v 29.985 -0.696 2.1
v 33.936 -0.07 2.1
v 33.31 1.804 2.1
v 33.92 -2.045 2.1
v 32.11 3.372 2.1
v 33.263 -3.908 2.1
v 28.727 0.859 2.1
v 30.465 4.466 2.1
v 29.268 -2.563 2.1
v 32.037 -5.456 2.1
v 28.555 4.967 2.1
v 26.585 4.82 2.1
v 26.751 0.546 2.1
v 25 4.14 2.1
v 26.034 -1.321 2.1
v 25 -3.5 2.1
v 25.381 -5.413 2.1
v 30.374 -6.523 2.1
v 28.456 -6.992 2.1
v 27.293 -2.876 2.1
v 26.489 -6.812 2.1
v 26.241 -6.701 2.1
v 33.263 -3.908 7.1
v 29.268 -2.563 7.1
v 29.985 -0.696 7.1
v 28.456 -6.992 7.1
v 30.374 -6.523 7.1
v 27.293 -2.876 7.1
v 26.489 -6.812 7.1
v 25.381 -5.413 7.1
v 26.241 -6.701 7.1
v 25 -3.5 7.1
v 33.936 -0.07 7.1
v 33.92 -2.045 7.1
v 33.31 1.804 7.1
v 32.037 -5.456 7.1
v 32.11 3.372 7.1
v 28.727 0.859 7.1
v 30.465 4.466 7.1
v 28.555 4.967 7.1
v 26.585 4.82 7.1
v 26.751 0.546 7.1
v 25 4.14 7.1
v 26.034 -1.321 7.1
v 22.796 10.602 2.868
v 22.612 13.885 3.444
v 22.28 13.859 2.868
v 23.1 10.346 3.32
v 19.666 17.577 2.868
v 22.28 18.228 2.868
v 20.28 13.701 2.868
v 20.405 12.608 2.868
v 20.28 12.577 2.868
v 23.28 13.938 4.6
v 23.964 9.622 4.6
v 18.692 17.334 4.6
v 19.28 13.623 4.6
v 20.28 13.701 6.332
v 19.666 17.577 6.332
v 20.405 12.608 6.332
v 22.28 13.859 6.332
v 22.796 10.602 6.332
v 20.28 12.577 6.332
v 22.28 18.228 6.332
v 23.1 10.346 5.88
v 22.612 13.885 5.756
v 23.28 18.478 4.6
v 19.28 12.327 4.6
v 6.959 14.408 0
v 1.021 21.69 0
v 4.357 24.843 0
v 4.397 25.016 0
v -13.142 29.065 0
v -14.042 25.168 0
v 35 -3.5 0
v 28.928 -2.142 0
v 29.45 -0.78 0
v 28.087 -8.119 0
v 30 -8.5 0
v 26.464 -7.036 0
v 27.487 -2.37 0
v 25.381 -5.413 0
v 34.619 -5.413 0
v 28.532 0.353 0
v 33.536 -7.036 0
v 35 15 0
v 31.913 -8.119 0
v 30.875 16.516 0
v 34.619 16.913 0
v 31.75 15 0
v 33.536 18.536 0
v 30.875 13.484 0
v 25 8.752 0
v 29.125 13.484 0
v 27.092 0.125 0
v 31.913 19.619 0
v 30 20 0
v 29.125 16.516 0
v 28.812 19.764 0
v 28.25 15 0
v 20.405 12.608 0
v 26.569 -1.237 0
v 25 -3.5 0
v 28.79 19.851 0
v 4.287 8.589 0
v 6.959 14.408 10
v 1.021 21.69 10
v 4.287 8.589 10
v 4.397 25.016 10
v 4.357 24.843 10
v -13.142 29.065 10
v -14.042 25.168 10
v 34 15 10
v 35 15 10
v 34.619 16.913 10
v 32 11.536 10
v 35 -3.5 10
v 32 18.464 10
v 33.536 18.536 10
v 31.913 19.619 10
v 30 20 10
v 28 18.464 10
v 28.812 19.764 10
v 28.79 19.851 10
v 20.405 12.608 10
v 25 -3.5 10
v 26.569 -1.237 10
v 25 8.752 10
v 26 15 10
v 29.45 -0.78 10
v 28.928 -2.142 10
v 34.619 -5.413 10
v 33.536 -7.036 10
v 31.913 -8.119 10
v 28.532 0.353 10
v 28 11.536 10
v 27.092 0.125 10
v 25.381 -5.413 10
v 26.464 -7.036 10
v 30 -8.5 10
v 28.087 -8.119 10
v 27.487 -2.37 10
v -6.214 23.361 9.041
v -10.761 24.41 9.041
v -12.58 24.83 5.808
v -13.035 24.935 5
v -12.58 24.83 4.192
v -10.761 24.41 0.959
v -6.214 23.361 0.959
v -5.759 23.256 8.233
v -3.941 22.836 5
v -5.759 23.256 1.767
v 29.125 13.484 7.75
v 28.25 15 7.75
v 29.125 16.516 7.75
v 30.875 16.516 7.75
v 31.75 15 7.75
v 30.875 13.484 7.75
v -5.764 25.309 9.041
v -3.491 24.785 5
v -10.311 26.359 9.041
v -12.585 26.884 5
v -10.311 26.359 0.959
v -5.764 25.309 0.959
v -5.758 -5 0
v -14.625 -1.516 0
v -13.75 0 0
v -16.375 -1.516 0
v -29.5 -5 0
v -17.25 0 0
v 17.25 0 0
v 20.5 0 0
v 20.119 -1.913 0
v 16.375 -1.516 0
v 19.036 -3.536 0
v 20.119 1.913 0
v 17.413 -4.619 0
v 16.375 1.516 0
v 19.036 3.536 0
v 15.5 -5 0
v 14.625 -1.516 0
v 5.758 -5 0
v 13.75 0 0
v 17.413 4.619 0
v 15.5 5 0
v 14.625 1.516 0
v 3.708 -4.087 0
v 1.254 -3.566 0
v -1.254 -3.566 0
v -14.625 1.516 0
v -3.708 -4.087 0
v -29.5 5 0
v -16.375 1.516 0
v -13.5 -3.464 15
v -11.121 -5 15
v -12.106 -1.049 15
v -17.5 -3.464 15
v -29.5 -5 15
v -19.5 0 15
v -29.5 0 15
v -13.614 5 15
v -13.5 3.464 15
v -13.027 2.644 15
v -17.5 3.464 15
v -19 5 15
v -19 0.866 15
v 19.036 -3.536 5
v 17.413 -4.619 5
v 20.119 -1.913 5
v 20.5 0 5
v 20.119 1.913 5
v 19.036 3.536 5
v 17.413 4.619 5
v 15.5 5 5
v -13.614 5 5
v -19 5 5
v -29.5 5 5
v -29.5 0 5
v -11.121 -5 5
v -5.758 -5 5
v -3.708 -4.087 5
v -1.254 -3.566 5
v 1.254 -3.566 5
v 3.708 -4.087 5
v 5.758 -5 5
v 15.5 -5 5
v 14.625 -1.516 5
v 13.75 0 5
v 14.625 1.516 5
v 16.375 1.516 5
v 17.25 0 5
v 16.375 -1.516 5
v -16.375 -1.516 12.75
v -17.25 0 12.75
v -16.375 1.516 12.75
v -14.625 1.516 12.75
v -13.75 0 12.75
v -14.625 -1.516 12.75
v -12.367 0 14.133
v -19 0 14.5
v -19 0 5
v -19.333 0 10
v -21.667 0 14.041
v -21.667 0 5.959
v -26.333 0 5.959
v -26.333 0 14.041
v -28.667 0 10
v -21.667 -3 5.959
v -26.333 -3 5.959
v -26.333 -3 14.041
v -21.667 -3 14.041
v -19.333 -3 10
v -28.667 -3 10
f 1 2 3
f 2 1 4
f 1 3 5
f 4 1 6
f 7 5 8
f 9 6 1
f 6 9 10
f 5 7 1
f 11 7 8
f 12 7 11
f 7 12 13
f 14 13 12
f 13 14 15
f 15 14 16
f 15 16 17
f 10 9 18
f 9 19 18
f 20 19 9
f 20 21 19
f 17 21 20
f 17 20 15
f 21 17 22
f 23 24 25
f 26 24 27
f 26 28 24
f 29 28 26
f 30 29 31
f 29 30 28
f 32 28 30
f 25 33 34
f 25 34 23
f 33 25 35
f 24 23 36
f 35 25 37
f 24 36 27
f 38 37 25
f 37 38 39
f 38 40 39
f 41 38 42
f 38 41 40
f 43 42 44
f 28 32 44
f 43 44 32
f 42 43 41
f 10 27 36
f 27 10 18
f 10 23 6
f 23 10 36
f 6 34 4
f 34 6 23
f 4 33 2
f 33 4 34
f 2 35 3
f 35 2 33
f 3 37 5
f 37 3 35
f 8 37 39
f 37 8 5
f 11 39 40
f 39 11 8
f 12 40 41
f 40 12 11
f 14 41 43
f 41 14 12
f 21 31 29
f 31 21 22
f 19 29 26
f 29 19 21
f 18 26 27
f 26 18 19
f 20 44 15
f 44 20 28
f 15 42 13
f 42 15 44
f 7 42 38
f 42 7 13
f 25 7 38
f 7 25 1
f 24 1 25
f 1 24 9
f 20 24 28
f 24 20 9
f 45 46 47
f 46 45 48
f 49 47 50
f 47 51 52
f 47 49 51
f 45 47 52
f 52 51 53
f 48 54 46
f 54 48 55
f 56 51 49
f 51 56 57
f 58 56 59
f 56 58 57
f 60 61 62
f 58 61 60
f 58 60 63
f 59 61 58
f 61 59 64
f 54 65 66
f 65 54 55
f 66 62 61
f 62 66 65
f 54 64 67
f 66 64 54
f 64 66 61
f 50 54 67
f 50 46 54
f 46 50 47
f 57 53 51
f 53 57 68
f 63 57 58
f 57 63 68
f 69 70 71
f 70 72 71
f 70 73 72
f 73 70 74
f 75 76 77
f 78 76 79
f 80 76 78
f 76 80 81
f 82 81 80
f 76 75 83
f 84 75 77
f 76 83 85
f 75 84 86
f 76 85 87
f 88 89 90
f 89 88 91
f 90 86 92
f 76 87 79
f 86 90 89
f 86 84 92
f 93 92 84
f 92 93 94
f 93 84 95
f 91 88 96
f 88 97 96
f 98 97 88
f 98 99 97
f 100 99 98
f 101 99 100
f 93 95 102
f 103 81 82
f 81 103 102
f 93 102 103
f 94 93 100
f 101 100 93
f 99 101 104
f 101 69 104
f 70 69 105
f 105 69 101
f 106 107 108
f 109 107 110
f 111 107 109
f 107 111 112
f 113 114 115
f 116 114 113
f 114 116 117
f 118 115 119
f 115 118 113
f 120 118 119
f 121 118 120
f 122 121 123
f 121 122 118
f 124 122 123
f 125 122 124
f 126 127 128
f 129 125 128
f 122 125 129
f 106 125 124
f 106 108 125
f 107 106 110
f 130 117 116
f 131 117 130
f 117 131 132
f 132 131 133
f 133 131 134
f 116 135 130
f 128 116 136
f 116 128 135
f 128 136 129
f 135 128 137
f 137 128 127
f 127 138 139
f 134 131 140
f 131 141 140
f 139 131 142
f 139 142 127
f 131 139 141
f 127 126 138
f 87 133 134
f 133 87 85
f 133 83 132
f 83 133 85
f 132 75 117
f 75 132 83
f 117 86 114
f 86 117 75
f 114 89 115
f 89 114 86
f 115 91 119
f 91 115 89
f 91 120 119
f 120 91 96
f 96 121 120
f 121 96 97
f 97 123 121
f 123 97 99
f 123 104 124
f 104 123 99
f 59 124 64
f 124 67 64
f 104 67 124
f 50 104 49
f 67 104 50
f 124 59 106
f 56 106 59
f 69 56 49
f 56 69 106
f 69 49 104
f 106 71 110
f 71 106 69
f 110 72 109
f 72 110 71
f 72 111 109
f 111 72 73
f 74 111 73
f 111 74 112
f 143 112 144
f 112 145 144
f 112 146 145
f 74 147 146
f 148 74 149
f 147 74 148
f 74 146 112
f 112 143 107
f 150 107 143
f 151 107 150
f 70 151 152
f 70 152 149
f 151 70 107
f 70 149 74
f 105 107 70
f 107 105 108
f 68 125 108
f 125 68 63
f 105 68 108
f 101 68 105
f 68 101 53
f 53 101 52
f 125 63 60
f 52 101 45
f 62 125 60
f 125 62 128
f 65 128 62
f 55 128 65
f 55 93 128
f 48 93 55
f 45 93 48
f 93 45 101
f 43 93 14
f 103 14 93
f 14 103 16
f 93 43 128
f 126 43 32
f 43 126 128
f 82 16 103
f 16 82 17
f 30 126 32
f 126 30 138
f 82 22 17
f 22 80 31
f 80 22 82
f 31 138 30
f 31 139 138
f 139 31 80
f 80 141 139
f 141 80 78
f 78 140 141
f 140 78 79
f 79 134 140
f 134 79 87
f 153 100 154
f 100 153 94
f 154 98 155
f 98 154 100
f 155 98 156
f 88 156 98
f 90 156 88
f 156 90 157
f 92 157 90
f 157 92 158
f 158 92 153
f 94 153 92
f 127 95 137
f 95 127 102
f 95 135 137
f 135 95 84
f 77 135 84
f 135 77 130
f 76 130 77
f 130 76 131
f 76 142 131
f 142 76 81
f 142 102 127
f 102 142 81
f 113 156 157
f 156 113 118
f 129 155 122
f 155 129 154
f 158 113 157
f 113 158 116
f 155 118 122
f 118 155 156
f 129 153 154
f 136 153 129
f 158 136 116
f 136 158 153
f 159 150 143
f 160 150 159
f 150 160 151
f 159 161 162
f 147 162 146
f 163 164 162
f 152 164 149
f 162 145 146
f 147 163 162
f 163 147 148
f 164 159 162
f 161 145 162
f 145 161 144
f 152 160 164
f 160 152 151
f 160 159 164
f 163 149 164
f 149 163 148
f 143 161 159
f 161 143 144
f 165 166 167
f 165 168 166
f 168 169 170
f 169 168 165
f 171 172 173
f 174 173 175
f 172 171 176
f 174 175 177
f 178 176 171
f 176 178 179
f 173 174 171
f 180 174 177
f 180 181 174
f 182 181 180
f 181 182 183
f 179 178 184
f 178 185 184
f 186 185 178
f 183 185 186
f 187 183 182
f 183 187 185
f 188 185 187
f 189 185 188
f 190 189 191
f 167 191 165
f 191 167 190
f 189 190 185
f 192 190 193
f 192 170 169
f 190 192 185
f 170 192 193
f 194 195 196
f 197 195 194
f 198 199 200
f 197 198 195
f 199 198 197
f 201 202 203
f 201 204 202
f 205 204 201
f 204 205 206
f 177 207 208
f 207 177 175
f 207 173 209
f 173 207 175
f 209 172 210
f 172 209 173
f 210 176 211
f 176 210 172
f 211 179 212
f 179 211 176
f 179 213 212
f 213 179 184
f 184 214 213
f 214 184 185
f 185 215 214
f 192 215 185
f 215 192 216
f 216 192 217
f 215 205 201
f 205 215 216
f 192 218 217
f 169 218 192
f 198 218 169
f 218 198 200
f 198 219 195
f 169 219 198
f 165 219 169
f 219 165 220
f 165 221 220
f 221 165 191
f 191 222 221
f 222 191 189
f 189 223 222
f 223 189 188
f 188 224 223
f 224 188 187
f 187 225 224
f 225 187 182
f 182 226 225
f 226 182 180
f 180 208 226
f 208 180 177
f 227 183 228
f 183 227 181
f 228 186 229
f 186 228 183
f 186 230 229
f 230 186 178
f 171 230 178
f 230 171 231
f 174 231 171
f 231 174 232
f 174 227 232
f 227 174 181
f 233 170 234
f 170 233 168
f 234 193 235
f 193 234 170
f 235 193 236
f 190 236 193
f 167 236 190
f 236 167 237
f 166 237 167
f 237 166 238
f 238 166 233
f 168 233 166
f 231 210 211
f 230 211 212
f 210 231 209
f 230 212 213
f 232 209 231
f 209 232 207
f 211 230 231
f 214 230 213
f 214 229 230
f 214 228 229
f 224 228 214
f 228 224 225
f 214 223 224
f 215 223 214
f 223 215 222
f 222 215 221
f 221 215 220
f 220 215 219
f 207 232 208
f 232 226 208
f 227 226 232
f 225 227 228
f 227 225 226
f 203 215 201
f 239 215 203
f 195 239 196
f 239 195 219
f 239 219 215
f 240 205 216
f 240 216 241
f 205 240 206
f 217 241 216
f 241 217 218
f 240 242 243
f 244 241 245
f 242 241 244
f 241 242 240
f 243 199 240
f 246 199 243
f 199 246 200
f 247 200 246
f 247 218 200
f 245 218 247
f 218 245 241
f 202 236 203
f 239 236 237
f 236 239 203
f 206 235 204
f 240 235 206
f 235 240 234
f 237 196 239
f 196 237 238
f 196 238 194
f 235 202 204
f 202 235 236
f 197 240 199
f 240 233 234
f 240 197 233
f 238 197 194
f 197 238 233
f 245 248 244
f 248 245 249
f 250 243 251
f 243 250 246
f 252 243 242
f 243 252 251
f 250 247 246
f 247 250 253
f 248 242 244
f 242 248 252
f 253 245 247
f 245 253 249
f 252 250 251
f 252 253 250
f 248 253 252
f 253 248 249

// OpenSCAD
filament_d = 1.75;
spring_d = 8;

plate();
//assembly();

module plate(){
translate([30,15,0])idler();
base();
}

module assembly(){
union(){
translate([0, 15.5, 0]) base();
translate([15.5, 15.5, 0]) {
	%translate([-15.5, -15.5, 0]) translate([10.56 / 2 + 4 + filament_d, 0, 7.7]) linear_extrude(height = 4, convexity = 5) difference() {// 693 bearing
		circle(4);
		circle(1.5, $fn = 6);
	}

	translate([0, 0, 5]) rotate(-9) idler();
}
%translate([-15.5+9,20.5,0])cube([30,5,15]);
%translate([0, 0, 2]) difference() {// drive gear
	linear_extrude(height = 11, convexity = 5) difference() {
		circle(6.3);
		circle(2.5);
	}
	translate([0, 0, 7.7]) rotate_extrude(convexity = 5, $fs = 0.5) translate([5 + 2.5, 0, 0]) circle(r = 2);
}}}

module idler() difference() {
	linear_extrude(height = 10, convexity = 5) difference() {
		union() {
			circle(5);
			translate([0, -18.5, 0]) circle(5);
			rotate(180) translate([-5, 0, 0]) square([10, 18.5]);
			rotate(104){
				square([5, 25]);
				translate([0,22.5])square([15.8,4]);
			}
			rotate(77)translate([0,27.2])square([4,18]);
			rotate(50) translate([-8, -2, 0]) square([5, 10]);
		}
		circle(3 * 7/12, $fn = 6);
		rotate(9) translate([-15.5 + 10.56 / 2 + 4 + filament_d, -15.5, 0]) circle(2.5* 7/12, $fn = 6);
	}
	translate([0, 0, 4.6]) {
		rotate(9) translate([-15.5 + 10.56 / 2 + 4 + filament_d, -15.5, 0]) linear_extrude(height = 5, convexity = 5, center = true) difference() {
			circle(6);
			circle(2, $fn = 6);
		}
		translate([10.56 / 2 + 1.5, 0, 0]) rotate([-90, 0, 9]) translate([-15.5, 0, -15.5]) cylinder(r = 2, h = 50, $fn = 6);
		translate([10.56 / 2 + 1.5, 0, 0]) rotate([-90, 0, 0]) translate([-15.5, 0, -15.5]) rotate([0, 0, 0]) cylinder(r = 2, h = 100, center = true, $fn = 6);
	}
	translate([0, 0, 10 - 4]) cylinder(r1 = 0, r2 = 8, h = 8, $fn = 6);
	translate([0, 0, 10 / 2]) rotate([90, 0, -13]) translate([-24-15.5, 0, -2]) cylinder(r = spring_d * 7/12, h = 10, $fn = 6);
}

module base() difference() {
	linear_extrude(height = 15, convexity = 5) difference() {
		union() {
			translate([-7,0,0])square([45, 10], center = true);
			translate([15.5, 0, 0]) circle(5);
		}
		for (side = [1, -1]) translate([side * 15.5, 0, 0]) circle(3 * 7/12, $fn = 6);
		translate([0, -15.5, 0]) circle(12);
	}
	rotate([0,0,14])translate([-12, -10, 5]) linear_extrude(height = 15, convexity = 5)square(100);
	translate([-39,0,5])cube(20);
	translate([-15.5, 0, 15 - 4]) cylinder(r1 = 0, r2 = 8, h = 8, $fn = 6);
	translate([-24, 7, 10]) rotate([90,0,0])cylinder(r = spring_d * 7/12,h=10, $fn = 6);
}
